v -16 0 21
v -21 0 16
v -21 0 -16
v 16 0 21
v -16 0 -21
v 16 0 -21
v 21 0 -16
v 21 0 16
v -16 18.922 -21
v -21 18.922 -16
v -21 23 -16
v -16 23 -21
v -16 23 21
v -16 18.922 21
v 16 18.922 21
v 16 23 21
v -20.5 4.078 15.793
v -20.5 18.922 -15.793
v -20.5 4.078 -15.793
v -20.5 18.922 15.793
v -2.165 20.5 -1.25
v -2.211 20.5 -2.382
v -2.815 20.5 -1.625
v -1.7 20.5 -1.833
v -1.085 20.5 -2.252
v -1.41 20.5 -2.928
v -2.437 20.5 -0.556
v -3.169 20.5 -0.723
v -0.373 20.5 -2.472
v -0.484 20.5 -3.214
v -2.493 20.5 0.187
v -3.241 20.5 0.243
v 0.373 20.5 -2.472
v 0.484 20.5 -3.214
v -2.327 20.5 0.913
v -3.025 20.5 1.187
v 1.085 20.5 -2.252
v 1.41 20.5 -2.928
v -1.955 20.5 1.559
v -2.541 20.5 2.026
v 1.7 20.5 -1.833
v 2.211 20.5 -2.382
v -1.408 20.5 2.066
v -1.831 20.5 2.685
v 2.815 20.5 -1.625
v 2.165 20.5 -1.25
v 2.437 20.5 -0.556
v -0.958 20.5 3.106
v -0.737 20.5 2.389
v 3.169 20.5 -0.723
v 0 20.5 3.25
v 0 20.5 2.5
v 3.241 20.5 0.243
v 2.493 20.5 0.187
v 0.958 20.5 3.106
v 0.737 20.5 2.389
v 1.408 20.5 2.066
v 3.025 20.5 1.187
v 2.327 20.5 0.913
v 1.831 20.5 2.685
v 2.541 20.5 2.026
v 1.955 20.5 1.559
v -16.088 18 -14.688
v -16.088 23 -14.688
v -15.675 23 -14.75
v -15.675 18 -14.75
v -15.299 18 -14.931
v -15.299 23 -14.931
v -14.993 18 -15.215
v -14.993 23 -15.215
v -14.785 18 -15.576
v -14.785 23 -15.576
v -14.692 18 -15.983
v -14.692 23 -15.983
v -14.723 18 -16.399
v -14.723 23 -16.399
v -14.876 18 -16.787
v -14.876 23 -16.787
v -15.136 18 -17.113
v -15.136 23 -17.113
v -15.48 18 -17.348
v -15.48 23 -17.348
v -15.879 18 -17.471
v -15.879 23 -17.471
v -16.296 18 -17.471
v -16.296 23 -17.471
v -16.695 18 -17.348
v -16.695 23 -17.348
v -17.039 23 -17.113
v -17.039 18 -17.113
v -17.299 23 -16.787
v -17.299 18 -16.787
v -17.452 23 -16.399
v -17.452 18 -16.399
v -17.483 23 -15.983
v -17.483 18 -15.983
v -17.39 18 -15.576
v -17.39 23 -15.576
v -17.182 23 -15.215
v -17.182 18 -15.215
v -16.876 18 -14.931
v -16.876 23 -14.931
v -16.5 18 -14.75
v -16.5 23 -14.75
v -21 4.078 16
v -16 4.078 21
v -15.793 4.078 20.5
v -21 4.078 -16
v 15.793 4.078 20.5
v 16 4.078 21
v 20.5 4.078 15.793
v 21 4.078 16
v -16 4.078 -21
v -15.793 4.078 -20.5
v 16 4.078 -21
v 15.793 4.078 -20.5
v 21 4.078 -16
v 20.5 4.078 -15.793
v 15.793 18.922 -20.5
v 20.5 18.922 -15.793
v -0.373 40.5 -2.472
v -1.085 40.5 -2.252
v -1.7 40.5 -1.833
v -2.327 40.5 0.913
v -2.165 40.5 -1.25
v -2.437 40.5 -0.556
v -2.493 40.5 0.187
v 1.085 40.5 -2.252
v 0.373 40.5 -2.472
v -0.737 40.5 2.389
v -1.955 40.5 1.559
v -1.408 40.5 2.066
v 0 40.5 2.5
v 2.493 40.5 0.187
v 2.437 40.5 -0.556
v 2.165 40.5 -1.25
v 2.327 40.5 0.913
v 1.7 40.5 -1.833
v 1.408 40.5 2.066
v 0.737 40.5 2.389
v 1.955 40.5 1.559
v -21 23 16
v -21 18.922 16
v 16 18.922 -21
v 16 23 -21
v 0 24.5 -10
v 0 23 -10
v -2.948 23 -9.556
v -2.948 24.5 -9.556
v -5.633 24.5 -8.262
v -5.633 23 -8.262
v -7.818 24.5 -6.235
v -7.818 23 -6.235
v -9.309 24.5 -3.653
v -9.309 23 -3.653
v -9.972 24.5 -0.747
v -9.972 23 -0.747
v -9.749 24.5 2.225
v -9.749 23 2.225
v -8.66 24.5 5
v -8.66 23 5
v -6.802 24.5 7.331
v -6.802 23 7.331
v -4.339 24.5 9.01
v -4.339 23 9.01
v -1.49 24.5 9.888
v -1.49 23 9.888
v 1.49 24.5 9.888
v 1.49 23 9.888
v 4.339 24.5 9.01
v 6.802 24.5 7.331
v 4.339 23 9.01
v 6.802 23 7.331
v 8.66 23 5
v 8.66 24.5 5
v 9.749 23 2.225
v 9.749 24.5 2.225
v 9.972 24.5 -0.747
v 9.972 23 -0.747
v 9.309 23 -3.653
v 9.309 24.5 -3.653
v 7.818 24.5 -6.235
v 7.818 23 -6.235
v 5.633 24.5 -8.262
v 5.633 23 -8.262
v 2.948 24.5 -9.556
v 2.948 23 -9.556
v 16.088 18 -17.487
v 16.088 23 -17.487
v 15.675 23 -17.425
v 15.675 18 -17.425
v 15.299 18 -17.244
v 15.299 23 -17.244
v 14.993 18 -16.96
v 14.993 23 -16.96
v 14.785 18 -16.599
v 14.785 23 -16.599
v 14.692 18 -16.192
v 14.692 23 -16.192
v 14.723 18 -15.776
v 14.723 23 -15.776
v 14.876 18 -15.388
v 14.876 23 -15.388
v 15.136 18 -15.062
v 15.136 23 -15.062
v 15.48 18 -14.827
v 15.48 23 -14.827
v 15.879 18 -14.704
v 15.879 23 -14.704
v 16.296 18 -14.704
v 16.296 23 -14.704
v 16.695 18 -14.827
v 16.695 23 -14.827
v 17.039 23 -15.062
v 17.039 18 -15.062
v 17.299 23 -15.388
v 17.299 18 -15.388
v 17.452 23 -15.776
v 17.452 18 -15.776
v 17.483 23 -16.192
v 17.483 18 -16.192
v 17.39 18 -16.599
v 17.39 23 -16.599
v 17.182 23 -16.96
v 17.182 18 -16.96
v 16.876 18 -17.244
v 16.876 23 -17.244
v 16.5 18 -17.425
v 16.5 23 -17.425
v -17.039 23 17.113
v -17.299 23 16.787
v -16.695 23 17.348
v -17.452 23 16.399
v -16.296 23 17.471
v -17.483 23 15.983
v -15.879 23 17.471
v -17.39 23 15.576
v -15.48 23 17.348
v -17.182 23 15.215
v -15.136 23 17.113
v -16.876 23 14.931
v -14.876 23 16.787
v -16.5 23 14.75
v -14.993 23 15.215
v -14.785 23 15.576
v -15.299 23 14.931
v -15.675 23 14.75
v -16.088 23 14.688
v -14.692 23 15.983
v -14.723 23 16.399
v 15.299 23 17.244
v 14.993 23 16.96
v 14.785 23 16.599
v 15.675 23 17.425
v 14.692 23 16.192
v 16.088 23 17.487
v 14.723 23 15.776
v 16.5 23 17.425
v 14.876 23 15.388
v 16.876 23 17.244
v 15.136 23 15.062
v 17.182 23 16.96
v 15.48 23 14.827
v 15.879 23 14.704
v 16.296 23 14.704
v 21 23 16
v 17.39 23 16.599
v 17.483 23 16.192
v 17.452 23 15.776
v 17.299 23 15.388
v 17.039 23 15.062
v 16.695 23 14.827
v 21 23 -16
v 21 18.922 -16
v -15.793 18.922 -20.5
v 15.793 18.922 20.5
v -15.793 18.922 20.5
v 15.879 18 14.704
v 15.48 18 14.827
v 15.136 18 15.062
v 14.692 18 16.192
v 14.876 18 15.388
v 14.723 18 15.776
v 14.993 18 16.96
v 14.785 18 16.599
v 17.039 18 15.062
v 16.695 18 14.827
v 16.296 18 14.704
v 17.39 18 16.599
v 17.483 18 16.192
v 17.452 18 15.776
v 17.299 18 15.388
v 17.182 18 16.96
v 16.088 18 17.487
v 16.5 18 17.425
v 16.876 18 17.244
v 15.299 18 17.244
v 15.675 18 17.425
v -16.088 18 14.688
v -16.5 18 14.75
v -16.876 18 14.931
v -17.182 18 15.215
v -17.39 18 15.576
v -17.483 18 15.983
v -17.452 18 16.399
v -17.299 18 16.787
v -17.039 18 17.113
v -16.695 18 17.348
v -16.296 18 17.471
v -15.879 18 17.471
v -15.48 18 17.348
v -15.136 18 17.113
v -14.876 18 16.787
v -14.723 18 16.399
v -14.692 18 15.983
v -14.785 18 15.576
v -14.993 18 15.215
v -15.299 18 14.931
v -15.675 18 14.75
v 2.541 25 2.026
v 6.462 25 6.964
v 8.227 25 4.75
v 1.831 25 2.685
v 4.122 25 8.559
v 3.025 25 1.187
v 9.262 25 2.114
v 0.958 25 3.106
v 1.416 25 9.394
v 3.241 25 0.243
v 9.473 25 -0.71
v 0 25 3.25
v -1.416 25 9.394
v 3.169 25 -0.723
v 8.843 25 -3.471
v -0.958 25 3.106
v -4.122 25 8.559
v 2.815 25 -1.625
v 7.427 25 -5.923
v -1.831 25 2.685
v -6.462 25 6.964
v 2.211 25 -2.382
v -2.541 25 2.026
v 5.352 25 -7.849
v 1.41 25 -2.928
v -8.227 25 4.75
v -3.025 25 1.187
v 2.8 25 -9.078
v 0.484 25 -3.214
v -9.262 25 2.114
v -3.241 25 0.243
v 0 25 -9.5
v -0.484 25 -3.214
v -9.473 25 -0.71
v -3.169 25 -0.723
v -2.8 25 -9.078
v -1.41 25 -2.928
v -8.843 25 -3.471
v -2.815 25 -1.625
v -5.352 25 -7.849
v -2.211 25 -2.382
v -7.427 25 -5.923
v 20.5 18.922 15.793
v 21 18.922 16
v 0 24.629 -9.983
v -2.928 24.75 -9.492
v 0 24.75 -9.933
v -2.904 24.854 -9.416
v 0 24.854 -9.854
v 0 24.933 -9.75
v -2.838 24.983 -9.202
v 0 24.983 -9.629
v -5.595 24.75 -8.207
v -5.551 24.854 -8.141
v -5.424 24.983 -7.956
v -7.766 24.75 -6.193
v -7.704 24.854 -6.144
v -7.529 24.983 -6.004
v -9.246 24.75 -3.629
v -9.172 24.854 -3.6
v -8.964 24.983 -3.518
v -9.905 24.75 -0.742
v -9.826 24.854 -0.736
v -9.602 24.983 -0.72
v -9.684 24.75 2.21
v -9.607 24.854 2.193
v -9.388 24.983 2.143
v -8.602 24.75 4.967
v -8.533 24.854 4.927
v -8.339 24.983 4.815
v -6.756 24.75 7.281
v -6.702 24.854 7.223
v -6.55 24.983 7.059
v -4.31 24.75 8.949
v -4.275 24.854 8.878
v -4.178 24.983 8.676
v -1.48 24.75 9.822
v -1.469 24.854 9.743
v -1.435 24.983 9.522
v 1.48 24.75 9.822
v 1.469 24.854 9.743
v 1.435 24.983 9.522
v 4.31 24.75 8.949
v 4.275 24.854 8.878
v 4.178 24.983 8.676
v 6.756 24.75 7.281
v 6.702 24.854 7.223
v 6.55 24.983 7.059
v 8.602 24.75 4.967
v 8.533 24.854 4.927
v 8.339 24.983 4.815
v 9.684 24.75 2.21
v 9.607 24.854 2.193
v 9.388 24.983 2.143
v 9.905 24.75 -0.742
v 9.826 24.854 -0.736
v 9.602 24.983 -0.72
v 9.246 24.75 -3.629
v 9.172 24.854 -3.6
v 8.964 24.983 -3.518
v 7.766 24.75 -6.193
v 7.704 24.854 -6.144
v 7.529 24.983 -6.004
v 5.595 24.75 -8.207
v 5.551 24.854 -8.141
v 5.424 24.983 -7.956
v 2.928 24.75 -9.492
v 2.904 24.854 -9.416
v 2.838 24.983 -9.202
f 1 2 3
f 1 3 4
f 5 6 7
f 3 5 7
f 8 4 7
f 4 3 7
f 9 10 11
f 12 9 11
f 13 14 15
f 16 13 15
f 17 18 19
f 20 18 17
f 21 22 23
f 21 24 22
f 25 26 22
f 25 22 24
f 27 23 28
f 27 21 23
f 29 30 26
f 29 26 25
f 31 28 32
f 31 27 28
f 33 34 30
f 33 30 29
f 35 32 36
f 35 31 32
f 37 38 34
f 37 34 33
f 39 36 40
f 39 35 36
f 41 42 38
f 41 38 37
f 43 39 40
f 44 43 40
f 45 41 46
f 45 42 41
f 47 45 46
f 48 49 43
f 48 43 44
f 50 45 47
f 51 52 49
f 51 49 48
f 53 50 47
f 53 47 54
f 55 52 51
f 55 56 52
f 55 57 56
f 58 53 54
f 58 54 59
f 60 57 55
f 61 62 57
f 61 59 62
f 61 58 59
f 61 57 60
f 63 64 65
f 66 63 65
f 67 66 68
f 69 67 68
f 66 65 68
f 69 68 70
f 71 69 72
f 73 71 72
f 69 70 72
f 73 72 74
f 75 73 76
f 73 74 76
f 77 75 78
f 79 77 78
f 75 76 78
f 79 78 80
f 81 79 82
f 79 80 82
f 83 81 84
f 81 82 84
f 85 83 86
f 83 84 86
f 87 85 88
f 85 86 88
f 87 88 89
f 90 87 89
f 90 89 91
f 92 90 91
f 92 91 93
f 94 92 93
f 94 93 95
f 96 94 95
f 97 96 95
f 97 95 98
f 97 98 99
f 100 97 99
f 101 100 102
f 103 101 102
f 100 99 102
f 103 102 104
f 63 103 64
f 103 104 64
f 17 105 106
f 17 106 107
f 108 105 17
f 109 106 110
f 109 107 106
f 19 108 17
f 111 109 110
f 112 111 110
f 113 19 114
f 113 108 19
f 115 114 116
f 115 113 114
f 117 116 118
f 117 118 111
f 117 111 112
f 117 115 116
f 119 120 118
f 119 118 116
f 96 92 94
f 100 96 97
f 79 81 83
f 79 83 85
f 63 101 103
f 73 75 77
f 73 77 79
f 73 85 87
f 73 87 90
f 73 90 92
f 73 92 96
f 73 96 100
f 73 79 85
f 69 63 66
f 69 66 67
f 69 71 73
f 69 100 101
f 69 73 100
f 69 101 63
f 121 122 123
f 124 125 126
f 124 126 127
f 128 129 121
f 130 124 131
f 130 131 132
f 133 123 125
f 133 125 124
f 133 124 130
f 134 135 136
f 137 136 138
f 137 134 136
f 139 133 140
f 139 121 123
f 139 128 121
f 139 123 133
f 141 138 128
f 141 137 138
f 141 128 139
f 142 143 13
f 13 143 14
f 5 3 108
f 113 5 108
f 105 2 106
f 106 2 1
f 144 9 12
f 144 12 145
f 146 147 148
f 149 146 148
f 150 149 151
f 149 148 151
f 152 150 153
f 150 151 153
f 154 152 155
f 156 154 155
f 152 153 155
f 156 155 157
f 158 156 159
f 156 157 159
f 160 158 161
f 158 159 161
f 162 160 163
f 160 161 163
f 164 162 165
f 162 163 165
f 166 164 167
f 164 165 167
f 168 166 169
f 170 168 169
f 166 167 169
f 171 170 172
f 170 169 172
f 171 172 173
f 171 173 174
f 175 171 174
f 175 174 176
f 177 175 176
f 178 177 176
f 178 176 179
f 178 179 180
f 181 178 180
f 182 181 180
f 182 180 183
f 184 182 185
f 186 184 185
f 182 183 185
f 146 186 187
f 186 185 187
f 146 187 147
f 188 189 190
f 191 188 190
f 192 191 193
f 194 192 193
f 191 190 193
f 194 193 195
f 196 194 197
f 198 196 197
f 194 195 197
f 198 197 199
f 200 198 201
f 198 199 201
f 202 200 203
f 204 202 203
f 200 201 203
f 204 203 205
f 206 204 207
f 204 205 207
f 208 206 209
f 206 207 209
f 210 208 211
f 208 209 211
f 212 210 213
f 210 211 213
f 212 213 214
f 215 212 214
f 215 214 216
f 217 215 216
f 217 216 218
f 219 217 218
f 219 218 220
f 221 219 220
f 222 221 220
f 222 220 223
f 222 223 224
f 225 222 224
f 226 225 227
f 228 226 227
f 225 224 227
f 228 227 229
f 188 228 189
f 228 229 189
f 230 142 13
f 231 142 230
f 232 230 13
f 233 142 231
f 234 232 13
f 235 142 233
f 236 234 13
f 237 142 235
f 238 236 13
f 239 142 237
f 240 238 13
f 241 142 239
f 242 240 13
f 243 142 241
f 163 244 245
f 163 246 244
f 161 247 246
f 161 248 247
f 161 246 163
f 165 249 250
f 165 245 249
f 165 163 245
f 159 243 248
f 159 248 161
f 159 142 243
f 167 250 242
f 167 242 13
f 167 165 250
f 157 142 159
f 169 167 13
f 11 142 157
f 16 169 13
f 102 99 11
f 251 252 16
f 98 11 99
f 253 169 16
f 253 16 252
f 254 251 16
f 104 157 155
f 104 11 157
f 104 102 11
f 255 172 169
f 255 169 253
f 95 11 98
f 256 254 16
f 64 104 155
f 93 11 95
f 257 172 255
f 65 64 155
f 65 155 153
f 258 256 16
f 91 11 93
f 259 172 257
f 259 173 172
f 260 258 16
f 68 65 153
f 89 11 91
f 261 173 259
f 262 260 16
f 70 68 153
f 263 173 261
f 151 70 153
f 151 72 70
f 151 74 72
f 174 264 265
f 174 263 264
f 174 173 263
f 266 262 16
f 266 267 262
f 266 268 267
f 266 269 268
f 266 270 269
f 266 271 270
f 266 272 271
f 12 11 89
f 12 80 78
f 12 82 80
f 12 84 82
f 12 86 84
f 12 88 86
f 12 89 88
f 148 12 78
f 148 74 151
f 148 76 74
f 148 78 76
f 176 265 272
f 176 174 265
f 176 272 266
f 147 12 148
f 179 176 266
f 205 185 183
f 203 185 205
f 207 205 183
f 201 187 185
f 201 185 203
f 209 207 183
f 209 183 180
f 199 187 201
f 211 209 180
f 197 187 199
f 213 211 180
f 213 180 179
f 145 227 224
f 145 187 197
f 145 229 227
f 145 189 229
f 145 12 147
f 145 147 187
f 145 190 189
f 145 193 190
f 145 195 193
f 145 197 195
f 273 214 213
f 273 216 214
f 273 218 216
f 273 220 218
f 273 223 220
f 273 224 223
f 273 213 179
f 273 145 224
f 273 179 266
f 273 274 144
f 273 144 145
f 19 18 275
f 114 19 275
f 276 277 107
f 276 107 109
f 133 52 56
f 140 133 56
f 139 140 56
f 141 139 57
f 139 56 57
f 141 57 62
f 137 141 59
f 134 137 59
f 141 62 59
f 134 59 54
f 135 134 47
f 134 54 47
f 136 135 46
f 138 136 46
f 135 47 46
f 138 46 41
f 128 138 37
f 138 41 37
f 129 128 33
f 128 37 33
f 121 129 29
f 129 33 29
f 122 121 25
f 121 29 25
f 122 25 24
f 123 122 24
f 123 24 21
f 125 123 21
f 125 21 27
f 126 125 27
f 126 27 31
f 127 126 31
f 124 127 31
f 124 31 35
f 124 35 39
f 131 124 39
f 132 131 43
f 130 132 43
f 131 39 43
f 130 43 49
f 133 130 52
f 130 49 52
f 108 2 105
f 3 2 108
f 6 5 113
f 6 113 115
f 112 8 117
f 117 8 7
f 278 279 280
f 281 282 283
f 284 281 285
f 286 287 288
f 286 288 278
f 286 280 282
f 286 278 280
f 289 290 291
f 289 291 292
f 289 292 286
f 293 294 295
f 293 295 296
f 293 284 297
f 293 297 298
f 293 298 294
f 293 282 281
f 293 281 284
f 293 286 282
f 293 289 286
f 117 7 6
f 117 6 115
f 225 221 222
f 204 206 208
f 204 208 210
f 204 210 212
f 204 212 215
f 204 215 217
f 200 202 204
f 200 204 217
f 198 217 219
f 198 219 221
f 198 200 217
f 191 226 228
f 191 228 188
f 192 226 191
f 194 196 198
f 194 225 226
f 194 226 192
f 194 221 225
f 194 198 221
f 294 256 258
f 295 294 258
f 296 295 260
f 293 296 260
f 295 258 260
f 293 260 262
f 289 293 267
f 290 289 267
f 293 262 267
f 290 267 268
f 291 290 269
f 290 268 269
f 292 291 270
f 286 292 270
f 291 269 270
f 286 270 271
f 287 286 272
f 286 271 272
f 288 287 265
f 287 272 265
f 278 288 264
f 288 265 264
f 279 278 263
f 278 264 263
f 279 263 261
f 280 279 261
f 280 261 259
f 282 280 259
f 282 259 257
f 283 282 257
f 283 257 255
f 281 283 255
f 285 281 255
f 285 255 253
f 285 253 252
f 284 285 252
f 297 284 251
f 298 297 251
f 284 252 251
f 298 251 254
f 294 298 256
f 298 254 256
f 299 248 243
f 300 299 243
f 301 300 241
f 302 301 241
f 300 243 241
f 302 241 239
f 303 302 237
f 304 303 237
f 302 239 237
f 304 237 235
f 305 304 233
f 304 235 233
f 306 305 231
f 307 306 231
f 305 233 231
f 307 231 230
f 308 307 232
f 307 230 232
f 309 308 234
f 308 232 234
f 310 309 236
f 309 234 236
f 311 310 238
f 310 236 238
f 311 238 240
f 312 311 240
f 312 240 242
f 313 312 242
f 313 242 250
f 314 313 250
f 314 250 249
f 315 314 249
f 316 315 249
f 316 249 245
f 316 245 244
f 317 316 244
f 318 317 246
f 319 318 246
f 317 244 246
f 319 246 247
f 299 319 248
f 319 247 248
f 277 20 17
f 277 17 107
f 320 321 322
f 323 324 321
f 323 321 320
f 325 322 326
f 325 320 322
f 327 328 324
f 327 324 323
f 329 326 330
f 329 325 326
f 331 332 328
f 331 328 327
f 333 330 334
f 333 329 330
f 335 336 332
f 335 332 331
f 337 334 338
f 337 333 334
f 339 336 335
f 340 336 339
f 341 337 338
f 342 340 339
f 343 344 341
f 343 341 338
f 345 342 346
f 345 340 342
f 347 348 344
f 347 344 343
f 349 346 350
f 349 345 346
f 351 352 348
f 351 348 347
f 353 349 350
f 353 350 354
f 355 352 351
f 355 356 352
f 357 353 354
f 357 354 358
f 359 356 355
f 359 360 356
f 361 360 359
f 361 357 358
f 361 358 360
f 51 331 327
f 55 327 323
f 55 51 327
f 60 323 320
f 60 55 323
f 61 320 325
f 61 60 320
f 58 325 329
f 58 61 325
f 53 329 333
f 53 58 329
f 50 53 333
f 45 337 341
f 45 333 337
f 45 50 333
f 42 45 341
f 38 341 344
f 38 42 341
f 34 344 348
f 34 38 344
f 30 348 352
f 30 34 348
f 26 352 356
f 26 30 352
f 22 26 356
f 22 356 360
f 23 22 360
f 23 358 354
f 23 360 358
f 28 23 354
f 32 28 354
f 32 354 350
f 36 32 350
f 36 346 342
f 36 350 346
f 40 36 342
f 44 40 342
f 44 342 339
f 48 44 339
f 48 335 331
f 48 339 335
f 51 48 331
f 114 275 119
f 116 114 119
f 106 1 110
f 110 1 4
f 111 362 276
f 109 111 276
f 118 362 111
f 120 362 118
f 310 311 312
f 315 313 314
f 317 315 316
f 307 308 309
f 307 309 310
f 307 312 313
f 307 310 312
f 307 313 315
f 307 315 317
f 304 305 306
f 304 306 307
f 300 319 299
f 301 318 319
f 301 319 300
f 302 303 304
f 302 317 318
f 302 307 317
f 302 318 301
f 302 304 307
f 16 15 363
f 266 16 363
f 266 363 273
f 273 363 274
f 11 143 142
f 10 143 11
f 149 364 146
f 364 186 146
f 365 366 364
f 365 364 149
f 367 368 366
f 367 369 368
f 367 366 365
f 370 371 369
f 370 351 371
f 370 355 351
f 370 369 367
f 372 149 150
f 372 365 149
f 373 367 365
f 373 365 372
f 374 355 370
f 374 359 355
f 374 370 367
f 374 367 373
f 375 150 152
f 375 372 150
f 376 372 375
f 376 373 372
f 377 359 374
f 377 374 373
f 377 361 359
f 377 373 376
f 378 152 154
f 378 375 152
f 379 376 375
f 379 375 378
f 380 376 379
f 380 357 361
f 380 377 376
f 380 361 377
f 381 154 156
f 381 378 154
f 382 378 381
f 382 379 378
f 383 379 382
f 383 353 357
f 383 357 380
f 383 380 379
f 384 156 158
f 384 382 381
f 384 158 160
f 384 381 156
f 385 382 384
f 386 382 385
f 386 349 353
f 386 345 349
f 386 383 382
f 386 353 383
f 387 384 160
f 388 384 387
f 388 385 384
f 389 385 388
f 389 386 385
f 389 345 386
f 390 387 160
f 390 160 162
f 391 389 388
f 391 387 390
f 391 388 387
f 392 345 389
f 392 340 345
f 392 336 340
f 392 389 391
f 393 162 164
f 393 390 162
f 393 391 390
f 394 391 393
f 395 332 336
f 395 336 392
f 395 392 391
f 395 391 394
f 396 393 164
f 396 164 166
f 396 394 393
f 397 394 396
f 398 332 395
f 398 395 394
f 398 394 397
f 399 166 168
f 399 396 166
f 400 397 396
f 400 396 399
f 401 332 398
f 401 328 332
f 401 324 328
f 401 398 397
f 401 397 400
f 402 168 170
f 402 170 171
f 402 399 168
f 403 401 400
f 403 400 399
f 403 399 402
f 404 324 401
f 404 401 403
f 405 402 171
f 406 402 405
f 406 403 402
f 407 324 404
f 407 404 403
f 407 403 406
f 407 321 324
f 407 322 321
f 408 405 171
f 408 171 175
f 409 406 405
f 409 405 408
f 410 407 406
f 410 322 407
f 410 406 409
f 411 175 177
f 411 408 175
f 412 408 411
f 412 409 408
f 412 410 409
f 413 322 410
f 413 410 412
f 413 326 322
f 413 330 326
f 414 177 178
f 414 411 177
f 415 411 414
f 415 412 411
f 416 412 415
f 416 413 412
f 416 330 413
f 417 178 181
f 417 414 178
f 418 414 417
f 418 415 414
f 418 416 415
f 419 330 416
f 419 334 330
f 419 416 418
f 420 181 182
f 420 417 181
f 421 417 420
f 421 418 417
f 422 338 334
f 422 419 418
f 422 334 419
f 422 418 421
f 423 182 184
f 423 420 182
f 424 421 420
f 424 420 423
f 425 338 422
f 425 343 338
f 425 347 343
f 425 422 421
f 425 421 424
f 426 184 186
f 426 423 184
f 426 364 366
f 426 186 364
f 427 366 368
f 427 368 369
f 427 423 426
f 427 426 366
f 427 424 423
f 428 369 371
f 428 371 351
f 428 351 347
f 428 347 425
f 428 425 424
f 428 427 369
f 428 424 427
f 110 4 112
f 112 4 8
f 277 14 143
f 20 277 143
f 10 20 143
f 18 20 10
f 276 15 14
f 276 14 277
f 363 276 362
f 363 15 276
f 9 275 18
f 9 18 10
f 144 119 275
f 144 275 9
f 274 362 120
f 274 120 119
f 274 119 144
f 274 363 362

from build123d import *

# Parameters (mm, degrees)
IZIM1_W                     = 42
IZIM1_H                     = 42
Y_KSEKLIK_EKSTR_ZYON1_DEPTH = 23
IZIM2_W                     = 71.608863679
IZIM2_H                     = 14.84454832
KES_EKSTR_ZYON1_DEPTH       = 0.5
PAH1_SIZE                   = 5
PAH2_SIZE                   = 5
PAH3_SIZE                   = 5
PAH4_SIZE                   = 5
IZIM3_W                     = 11.40471201
IZIM3_H                     = 14.84454832
KES_EKSTR_ZYON2_DEPTH       = 10.5
IZIM6_W                     = 48.50384319
IZIM6_H                     = 14.84454832
KES_EKSTR_ZYON3_DEPTH       = 0.5
IZIM7_W                     = 38.182763894
IZIM7_H                     = 14.84454832
KES_EKSTR_ZYON4_DEPTH       = 0.5
AYNALAMA3_COPY_1_SKETCH_W   = 11.40471201
AYNALAMA3_COPY_1_SKETCH_H   = 14.84454832
AYNALAMA3_COPY_1_DEPTH      = 10.5
AYNALAMA3_COPY_2_SKETCH_W   = 11.40471201
AYNALAMA3_COPY_2_SKETCH_H   = 14.84454832
AYNALAMA3_COPY_2_DEPTH      = 10.5
IZIM8_R                     = 1.399371897
KES_EKSTR_ZYON5_DEPTH       = 5
IZIM9_R                     = 10
Y_KSEKLIK_EKSTR_ZYON2_DEPTH = 2
KES_EKSTR_ZYON6_DEPTH       = 5
KES_EKSTR_ZYON6_DEPTH_BACK  = 2.5
IZIM10_R                    = 3.25
IZIM11_R                    = 2.5
Y_KSEKLIK_EKSTR_ZYON3_DEPTH = 20
RADYUS2_R                   = 0.5


with BuildPart() as part:
    # Çizim1 → Yükseklik-Ekstrüzyon1 (new body)
    with BuildSketch(Plane(origin=(0, 0, 0), x_dir=(1, 0, 0), z_dir=(0, 1, 0))):
        Rectangle(IZIM1_W, IZIM1_H)
    extrude(amount=Y_KSEKLIK_EKSTR_ZYON1_DEPTH)

    # Çizim2 → Kes-Ekstrüzyon1 (cut)
    with BuildSketch(Plane.XY.offset(21)):
        with Locations((-0.989717409, 11.5)):
            Rectangle(IZIM2_W, IZIM2_H)
    kes_ekstr_zyon1 = extrude(amount=-KES_EKSTR_ZYON1_DEPTH, mode=Mode.SUBTRACT)

    # Pah1
    # the kernel refuses this chamfer: 5 mm, written as the material it takes off along each edge
    with BuildSketch(Plane(origin=(-21, -12.85841494, 21), x_dir=(0.9996219169112968, 0, 0.027495876610586317), z_dir=(0, 1, 0))) as pah1_piece_1:
        Polygon((PAH1_SIZE * 0.999621916911, PAH1_SIZE * 0.0274958766106), (-PAH1_SIZE * 0.0274958766106, PAH1_SIZE * 0.999621916911), (0, 0), align=None)
    extrude(amount=29.79455572, mode=Mode.SUBTRACT)
    with BuildSketch(Plane(origin=(-21, 6.06385922, 21), x_dir=(-0.027495876610586317, 0, -0.9996219169112968), z_dir=(0, 1, 0))) as pah1_piece_2:
        Polygon((PAH1_SIZE * 0.999621916911, -PAH1_SIZE * 0.0274958766106), (-PAH1_SIZE * 0.0274958766106, -PAH1_SIZE * 0.999621916911), (0, 0), align=None)
    extrude(amount=29.79455572, mode=Mode.SUBTRACT)

    # Pah2
    # the kernel refuses this chamfer: 5 mm, written as the material it takes off along each edge
    with BuildSketch(Plane(origin=(21, -12.85841494, 21), x_dir=(-0.9996219169112968, 0, 0.027495876610586317), z_dir=(0, 1, 0)), Plane(origin=(21, 6.06385922, 21), x_dir=(-0.9996219169112968, 0, 0.027495876610586317), z_dir=(0, 1, 0))) as pah2_piece_1:
        Polygon((PAH2_SIZE * 0.999621916911, -PAH2_SIZE * 0.0274958766106), (-PAH2_SIZE * 0.0274958766106, -PAH2_SIZE * 0.999621916911), (0, 0), align=None)
    extrude(amount=29.79455572, mode=Mode.SUBTRACT)

    # Pah3
    pah3_edges = [part.edges().sort_by_distance(p)[0] for p in [
        (21, 11.5, -21),
    ]]
    chamfer(pah3_edges, length=PAH3_SIZE)

    # Pah4
    pah4_edges = [part.edges().sort_by_distance(p)[0] for p in [
        (-21, 11.5, -21),
    ]]
    chamfer(pah4_edges, length=PAH4_SIZE)

    # Çizim3 → Kes-Ekstrüzyon2 (cut)
    with BuildSketch(Plane(origin=(-25.571067812, 0, 25.571067812), x_dir=(0.707106781186546, 0, 0.707106781186549), z_dir=(-0.707106781186549, 0, 0.707106781186546))):
        with Locations((0, 11.5)):
            Rectangle(IZIM3_W, IZIM3_H)
    kes_ekstr_zyon2 = extrude(amount=-KES_EKSTR_ZYON2_DEPTH, mode=Mode.SUBTRACT)

    # Aynalama1: Kes-Ekstrüzyon1, Kes-Ekstrüzyon2 across plane
    add(kes_ekstr_zyon1.mirror(Plane.XY), mode=Mode.SUBTRACT)
    add(kes_ekstr_zyon2.mirror(Plane.XY), mode=Mode.SUBTRACT)

    # Aynalama2: Kes-Ekstrüzyon2 across plane
    add(kes_ekstr_zyon2.mirror(Plane(origin=(0, 0, 0), x_dir=(0, 0, 1), z_dir=(1, 0, 0))), mode=Mode.SUBTRACT)

    # Çizim6 → Kes-Ekstrüzyon3 (cut)
    with BuildSketch(Plane(origin=(21, 0, 0), x_dir=(0, 0, -1), z_dir=(1, 0, 0))):
        with Locations((0, 11.5)):
            Rectangle(IZIM6_W, IZIM6_H)
    extrude(amount=-KES_EKSTR_ZYON3_DEPTH, mode=Mode.SUBTRACT)

    # Çizim7 → Kes-Ekstrüzyon4 (cut)
    with BuildSketch(Plane.ZY.offset(21)):
        with Locations((0, 11.5)):
            Rectangle(IZIM7_W, IZIM7_H)
    extrude(amount=-KES_EKSTR_ZYON4_DEPTH, mode=Mode.SUBTRACT)

    # Aynalama3 copy 1 sketch → Aynalama3 copy 1 (cut)
    with BuildSketch(Plane(origin=(25.571067812, 0, -25.571067812), x_dir=(-0.707106781186546, 0, -0.707106781186549), z_dir=(0.707106781186549, 0, -0.707106781186546))):
        with Locations((0, 11.5)):
            Rectangle(AYNALAMA3_COPY_1_SKETCH_W, AYNALAMA3_COPY_1_SKETCH_H)
    extrude(amount=-AYNALAMA3_COPY_1_DEPTH, mode=Mode.SUBTRACT)

    # Aynalama3 copy 2 sketch → Aynalama3 copy 2 (cut)
    with BuildSketch(Plane(origin=(-25.571067812, 0, -25.571067812), x_dir=(0.707106781186546, 0, -0.707106781186549), z_dir=(-0.707106781186549, 0, -0.707106781186546))):
        with Locations((0, -11.5)):
            Rectangle(AYNALAMA3_COPY_2_SKETCH_W, AYNALAMA3_COPY_2_SKETCH_H)
    extrude(amount=-AYNALAMA3_COPY_2_DEPTH, mode=Mode.SUBTRACT)

    # Çizim8 → Kes-Ekstrüzyon5 (cut)
    with BuildSketch(Plane(origin=(0, 23, 0), x_dir=(1, 0, 0), z_dir=(0, 1, 0))):
        with Locations(Location((-16.087568017, 16.087568017, 0), (0, 0, 270))):
            Circle(IZIM8_R)
        with Locations(Location((16.087568017, 16.087568017, 0), (0, 0, 90))):
            Circle(IZIM8_R)
        with Locations(Location((16.087568017, -16.087568017, 0), (0, 0, 270))):
            Circle(IZIM8_R)
        with Locations(Location((-16.087568017, -16.087568017, 0), (0, 0, 90))):
            Circle(IZIM8_R)
    extrude(amount=-KES_EKSTR_ZYON5_DEPTH, mode=Mode.SUBTRACT)

    # Çizim9 → Yükseklik-Ekstrüzyon2 (add)
    with BuildSketch(Plane(origin=(0, 23, 0), x_dir=(1, 0, 0), z_dir=(0, 1, 0))):
        with Locations(Location((0, 0, 0), (0, 0, 90))):
            Circle(IZIM9_R)
    extrude(amount=Y_KSEKLIK_EKSTR_ZYON2_DEPTH)

    # Çizim10 → Kes-Ekstrüzyon6 (cut, two sides: drawn at the far end of the back side and taken through both)
    with BuildSketch(Plane(origin=(0, 23, 0), x_dir=(1, 0, 0), z_dir=(0, 1, 0)).offset(-KES_EKSTR_ZYON6_DEPTH_BACK)):
        with Locations(Location((0, 0, 0), (0, 0, 270))):
            Circle(IZIM10_R)
    extrude(amount=KES_EKSTR_ZYON6_DEPTH + KES_EKSTR_ZYON6_DEPTH_BACK, mode=Mode.SUBTRACT)

    # Çizim11 → Yükseklik-Ekstrüzyon3 (add)
    with BuildSketch(Plane(origin=(0, 20.5, 0), x_dir=(1, 0, 0), z_dir=(0, 1, 0))):
        with Locations(Location((0, 0, 0), (0, 0, 270))):
            Circle(IZIM11_R)
    extrude(amount=Y_KSEKLIK_EKSTR_ZYON3_DEPTH)

    # Radyus2
    radyus2_edges = [part.edges().sort_by_distance(p)[0] for p in [
        (0, 25, 10),
    ]]
    fillet(radyus2_edges, radius=RADYUS2_R)


solid = part.part
